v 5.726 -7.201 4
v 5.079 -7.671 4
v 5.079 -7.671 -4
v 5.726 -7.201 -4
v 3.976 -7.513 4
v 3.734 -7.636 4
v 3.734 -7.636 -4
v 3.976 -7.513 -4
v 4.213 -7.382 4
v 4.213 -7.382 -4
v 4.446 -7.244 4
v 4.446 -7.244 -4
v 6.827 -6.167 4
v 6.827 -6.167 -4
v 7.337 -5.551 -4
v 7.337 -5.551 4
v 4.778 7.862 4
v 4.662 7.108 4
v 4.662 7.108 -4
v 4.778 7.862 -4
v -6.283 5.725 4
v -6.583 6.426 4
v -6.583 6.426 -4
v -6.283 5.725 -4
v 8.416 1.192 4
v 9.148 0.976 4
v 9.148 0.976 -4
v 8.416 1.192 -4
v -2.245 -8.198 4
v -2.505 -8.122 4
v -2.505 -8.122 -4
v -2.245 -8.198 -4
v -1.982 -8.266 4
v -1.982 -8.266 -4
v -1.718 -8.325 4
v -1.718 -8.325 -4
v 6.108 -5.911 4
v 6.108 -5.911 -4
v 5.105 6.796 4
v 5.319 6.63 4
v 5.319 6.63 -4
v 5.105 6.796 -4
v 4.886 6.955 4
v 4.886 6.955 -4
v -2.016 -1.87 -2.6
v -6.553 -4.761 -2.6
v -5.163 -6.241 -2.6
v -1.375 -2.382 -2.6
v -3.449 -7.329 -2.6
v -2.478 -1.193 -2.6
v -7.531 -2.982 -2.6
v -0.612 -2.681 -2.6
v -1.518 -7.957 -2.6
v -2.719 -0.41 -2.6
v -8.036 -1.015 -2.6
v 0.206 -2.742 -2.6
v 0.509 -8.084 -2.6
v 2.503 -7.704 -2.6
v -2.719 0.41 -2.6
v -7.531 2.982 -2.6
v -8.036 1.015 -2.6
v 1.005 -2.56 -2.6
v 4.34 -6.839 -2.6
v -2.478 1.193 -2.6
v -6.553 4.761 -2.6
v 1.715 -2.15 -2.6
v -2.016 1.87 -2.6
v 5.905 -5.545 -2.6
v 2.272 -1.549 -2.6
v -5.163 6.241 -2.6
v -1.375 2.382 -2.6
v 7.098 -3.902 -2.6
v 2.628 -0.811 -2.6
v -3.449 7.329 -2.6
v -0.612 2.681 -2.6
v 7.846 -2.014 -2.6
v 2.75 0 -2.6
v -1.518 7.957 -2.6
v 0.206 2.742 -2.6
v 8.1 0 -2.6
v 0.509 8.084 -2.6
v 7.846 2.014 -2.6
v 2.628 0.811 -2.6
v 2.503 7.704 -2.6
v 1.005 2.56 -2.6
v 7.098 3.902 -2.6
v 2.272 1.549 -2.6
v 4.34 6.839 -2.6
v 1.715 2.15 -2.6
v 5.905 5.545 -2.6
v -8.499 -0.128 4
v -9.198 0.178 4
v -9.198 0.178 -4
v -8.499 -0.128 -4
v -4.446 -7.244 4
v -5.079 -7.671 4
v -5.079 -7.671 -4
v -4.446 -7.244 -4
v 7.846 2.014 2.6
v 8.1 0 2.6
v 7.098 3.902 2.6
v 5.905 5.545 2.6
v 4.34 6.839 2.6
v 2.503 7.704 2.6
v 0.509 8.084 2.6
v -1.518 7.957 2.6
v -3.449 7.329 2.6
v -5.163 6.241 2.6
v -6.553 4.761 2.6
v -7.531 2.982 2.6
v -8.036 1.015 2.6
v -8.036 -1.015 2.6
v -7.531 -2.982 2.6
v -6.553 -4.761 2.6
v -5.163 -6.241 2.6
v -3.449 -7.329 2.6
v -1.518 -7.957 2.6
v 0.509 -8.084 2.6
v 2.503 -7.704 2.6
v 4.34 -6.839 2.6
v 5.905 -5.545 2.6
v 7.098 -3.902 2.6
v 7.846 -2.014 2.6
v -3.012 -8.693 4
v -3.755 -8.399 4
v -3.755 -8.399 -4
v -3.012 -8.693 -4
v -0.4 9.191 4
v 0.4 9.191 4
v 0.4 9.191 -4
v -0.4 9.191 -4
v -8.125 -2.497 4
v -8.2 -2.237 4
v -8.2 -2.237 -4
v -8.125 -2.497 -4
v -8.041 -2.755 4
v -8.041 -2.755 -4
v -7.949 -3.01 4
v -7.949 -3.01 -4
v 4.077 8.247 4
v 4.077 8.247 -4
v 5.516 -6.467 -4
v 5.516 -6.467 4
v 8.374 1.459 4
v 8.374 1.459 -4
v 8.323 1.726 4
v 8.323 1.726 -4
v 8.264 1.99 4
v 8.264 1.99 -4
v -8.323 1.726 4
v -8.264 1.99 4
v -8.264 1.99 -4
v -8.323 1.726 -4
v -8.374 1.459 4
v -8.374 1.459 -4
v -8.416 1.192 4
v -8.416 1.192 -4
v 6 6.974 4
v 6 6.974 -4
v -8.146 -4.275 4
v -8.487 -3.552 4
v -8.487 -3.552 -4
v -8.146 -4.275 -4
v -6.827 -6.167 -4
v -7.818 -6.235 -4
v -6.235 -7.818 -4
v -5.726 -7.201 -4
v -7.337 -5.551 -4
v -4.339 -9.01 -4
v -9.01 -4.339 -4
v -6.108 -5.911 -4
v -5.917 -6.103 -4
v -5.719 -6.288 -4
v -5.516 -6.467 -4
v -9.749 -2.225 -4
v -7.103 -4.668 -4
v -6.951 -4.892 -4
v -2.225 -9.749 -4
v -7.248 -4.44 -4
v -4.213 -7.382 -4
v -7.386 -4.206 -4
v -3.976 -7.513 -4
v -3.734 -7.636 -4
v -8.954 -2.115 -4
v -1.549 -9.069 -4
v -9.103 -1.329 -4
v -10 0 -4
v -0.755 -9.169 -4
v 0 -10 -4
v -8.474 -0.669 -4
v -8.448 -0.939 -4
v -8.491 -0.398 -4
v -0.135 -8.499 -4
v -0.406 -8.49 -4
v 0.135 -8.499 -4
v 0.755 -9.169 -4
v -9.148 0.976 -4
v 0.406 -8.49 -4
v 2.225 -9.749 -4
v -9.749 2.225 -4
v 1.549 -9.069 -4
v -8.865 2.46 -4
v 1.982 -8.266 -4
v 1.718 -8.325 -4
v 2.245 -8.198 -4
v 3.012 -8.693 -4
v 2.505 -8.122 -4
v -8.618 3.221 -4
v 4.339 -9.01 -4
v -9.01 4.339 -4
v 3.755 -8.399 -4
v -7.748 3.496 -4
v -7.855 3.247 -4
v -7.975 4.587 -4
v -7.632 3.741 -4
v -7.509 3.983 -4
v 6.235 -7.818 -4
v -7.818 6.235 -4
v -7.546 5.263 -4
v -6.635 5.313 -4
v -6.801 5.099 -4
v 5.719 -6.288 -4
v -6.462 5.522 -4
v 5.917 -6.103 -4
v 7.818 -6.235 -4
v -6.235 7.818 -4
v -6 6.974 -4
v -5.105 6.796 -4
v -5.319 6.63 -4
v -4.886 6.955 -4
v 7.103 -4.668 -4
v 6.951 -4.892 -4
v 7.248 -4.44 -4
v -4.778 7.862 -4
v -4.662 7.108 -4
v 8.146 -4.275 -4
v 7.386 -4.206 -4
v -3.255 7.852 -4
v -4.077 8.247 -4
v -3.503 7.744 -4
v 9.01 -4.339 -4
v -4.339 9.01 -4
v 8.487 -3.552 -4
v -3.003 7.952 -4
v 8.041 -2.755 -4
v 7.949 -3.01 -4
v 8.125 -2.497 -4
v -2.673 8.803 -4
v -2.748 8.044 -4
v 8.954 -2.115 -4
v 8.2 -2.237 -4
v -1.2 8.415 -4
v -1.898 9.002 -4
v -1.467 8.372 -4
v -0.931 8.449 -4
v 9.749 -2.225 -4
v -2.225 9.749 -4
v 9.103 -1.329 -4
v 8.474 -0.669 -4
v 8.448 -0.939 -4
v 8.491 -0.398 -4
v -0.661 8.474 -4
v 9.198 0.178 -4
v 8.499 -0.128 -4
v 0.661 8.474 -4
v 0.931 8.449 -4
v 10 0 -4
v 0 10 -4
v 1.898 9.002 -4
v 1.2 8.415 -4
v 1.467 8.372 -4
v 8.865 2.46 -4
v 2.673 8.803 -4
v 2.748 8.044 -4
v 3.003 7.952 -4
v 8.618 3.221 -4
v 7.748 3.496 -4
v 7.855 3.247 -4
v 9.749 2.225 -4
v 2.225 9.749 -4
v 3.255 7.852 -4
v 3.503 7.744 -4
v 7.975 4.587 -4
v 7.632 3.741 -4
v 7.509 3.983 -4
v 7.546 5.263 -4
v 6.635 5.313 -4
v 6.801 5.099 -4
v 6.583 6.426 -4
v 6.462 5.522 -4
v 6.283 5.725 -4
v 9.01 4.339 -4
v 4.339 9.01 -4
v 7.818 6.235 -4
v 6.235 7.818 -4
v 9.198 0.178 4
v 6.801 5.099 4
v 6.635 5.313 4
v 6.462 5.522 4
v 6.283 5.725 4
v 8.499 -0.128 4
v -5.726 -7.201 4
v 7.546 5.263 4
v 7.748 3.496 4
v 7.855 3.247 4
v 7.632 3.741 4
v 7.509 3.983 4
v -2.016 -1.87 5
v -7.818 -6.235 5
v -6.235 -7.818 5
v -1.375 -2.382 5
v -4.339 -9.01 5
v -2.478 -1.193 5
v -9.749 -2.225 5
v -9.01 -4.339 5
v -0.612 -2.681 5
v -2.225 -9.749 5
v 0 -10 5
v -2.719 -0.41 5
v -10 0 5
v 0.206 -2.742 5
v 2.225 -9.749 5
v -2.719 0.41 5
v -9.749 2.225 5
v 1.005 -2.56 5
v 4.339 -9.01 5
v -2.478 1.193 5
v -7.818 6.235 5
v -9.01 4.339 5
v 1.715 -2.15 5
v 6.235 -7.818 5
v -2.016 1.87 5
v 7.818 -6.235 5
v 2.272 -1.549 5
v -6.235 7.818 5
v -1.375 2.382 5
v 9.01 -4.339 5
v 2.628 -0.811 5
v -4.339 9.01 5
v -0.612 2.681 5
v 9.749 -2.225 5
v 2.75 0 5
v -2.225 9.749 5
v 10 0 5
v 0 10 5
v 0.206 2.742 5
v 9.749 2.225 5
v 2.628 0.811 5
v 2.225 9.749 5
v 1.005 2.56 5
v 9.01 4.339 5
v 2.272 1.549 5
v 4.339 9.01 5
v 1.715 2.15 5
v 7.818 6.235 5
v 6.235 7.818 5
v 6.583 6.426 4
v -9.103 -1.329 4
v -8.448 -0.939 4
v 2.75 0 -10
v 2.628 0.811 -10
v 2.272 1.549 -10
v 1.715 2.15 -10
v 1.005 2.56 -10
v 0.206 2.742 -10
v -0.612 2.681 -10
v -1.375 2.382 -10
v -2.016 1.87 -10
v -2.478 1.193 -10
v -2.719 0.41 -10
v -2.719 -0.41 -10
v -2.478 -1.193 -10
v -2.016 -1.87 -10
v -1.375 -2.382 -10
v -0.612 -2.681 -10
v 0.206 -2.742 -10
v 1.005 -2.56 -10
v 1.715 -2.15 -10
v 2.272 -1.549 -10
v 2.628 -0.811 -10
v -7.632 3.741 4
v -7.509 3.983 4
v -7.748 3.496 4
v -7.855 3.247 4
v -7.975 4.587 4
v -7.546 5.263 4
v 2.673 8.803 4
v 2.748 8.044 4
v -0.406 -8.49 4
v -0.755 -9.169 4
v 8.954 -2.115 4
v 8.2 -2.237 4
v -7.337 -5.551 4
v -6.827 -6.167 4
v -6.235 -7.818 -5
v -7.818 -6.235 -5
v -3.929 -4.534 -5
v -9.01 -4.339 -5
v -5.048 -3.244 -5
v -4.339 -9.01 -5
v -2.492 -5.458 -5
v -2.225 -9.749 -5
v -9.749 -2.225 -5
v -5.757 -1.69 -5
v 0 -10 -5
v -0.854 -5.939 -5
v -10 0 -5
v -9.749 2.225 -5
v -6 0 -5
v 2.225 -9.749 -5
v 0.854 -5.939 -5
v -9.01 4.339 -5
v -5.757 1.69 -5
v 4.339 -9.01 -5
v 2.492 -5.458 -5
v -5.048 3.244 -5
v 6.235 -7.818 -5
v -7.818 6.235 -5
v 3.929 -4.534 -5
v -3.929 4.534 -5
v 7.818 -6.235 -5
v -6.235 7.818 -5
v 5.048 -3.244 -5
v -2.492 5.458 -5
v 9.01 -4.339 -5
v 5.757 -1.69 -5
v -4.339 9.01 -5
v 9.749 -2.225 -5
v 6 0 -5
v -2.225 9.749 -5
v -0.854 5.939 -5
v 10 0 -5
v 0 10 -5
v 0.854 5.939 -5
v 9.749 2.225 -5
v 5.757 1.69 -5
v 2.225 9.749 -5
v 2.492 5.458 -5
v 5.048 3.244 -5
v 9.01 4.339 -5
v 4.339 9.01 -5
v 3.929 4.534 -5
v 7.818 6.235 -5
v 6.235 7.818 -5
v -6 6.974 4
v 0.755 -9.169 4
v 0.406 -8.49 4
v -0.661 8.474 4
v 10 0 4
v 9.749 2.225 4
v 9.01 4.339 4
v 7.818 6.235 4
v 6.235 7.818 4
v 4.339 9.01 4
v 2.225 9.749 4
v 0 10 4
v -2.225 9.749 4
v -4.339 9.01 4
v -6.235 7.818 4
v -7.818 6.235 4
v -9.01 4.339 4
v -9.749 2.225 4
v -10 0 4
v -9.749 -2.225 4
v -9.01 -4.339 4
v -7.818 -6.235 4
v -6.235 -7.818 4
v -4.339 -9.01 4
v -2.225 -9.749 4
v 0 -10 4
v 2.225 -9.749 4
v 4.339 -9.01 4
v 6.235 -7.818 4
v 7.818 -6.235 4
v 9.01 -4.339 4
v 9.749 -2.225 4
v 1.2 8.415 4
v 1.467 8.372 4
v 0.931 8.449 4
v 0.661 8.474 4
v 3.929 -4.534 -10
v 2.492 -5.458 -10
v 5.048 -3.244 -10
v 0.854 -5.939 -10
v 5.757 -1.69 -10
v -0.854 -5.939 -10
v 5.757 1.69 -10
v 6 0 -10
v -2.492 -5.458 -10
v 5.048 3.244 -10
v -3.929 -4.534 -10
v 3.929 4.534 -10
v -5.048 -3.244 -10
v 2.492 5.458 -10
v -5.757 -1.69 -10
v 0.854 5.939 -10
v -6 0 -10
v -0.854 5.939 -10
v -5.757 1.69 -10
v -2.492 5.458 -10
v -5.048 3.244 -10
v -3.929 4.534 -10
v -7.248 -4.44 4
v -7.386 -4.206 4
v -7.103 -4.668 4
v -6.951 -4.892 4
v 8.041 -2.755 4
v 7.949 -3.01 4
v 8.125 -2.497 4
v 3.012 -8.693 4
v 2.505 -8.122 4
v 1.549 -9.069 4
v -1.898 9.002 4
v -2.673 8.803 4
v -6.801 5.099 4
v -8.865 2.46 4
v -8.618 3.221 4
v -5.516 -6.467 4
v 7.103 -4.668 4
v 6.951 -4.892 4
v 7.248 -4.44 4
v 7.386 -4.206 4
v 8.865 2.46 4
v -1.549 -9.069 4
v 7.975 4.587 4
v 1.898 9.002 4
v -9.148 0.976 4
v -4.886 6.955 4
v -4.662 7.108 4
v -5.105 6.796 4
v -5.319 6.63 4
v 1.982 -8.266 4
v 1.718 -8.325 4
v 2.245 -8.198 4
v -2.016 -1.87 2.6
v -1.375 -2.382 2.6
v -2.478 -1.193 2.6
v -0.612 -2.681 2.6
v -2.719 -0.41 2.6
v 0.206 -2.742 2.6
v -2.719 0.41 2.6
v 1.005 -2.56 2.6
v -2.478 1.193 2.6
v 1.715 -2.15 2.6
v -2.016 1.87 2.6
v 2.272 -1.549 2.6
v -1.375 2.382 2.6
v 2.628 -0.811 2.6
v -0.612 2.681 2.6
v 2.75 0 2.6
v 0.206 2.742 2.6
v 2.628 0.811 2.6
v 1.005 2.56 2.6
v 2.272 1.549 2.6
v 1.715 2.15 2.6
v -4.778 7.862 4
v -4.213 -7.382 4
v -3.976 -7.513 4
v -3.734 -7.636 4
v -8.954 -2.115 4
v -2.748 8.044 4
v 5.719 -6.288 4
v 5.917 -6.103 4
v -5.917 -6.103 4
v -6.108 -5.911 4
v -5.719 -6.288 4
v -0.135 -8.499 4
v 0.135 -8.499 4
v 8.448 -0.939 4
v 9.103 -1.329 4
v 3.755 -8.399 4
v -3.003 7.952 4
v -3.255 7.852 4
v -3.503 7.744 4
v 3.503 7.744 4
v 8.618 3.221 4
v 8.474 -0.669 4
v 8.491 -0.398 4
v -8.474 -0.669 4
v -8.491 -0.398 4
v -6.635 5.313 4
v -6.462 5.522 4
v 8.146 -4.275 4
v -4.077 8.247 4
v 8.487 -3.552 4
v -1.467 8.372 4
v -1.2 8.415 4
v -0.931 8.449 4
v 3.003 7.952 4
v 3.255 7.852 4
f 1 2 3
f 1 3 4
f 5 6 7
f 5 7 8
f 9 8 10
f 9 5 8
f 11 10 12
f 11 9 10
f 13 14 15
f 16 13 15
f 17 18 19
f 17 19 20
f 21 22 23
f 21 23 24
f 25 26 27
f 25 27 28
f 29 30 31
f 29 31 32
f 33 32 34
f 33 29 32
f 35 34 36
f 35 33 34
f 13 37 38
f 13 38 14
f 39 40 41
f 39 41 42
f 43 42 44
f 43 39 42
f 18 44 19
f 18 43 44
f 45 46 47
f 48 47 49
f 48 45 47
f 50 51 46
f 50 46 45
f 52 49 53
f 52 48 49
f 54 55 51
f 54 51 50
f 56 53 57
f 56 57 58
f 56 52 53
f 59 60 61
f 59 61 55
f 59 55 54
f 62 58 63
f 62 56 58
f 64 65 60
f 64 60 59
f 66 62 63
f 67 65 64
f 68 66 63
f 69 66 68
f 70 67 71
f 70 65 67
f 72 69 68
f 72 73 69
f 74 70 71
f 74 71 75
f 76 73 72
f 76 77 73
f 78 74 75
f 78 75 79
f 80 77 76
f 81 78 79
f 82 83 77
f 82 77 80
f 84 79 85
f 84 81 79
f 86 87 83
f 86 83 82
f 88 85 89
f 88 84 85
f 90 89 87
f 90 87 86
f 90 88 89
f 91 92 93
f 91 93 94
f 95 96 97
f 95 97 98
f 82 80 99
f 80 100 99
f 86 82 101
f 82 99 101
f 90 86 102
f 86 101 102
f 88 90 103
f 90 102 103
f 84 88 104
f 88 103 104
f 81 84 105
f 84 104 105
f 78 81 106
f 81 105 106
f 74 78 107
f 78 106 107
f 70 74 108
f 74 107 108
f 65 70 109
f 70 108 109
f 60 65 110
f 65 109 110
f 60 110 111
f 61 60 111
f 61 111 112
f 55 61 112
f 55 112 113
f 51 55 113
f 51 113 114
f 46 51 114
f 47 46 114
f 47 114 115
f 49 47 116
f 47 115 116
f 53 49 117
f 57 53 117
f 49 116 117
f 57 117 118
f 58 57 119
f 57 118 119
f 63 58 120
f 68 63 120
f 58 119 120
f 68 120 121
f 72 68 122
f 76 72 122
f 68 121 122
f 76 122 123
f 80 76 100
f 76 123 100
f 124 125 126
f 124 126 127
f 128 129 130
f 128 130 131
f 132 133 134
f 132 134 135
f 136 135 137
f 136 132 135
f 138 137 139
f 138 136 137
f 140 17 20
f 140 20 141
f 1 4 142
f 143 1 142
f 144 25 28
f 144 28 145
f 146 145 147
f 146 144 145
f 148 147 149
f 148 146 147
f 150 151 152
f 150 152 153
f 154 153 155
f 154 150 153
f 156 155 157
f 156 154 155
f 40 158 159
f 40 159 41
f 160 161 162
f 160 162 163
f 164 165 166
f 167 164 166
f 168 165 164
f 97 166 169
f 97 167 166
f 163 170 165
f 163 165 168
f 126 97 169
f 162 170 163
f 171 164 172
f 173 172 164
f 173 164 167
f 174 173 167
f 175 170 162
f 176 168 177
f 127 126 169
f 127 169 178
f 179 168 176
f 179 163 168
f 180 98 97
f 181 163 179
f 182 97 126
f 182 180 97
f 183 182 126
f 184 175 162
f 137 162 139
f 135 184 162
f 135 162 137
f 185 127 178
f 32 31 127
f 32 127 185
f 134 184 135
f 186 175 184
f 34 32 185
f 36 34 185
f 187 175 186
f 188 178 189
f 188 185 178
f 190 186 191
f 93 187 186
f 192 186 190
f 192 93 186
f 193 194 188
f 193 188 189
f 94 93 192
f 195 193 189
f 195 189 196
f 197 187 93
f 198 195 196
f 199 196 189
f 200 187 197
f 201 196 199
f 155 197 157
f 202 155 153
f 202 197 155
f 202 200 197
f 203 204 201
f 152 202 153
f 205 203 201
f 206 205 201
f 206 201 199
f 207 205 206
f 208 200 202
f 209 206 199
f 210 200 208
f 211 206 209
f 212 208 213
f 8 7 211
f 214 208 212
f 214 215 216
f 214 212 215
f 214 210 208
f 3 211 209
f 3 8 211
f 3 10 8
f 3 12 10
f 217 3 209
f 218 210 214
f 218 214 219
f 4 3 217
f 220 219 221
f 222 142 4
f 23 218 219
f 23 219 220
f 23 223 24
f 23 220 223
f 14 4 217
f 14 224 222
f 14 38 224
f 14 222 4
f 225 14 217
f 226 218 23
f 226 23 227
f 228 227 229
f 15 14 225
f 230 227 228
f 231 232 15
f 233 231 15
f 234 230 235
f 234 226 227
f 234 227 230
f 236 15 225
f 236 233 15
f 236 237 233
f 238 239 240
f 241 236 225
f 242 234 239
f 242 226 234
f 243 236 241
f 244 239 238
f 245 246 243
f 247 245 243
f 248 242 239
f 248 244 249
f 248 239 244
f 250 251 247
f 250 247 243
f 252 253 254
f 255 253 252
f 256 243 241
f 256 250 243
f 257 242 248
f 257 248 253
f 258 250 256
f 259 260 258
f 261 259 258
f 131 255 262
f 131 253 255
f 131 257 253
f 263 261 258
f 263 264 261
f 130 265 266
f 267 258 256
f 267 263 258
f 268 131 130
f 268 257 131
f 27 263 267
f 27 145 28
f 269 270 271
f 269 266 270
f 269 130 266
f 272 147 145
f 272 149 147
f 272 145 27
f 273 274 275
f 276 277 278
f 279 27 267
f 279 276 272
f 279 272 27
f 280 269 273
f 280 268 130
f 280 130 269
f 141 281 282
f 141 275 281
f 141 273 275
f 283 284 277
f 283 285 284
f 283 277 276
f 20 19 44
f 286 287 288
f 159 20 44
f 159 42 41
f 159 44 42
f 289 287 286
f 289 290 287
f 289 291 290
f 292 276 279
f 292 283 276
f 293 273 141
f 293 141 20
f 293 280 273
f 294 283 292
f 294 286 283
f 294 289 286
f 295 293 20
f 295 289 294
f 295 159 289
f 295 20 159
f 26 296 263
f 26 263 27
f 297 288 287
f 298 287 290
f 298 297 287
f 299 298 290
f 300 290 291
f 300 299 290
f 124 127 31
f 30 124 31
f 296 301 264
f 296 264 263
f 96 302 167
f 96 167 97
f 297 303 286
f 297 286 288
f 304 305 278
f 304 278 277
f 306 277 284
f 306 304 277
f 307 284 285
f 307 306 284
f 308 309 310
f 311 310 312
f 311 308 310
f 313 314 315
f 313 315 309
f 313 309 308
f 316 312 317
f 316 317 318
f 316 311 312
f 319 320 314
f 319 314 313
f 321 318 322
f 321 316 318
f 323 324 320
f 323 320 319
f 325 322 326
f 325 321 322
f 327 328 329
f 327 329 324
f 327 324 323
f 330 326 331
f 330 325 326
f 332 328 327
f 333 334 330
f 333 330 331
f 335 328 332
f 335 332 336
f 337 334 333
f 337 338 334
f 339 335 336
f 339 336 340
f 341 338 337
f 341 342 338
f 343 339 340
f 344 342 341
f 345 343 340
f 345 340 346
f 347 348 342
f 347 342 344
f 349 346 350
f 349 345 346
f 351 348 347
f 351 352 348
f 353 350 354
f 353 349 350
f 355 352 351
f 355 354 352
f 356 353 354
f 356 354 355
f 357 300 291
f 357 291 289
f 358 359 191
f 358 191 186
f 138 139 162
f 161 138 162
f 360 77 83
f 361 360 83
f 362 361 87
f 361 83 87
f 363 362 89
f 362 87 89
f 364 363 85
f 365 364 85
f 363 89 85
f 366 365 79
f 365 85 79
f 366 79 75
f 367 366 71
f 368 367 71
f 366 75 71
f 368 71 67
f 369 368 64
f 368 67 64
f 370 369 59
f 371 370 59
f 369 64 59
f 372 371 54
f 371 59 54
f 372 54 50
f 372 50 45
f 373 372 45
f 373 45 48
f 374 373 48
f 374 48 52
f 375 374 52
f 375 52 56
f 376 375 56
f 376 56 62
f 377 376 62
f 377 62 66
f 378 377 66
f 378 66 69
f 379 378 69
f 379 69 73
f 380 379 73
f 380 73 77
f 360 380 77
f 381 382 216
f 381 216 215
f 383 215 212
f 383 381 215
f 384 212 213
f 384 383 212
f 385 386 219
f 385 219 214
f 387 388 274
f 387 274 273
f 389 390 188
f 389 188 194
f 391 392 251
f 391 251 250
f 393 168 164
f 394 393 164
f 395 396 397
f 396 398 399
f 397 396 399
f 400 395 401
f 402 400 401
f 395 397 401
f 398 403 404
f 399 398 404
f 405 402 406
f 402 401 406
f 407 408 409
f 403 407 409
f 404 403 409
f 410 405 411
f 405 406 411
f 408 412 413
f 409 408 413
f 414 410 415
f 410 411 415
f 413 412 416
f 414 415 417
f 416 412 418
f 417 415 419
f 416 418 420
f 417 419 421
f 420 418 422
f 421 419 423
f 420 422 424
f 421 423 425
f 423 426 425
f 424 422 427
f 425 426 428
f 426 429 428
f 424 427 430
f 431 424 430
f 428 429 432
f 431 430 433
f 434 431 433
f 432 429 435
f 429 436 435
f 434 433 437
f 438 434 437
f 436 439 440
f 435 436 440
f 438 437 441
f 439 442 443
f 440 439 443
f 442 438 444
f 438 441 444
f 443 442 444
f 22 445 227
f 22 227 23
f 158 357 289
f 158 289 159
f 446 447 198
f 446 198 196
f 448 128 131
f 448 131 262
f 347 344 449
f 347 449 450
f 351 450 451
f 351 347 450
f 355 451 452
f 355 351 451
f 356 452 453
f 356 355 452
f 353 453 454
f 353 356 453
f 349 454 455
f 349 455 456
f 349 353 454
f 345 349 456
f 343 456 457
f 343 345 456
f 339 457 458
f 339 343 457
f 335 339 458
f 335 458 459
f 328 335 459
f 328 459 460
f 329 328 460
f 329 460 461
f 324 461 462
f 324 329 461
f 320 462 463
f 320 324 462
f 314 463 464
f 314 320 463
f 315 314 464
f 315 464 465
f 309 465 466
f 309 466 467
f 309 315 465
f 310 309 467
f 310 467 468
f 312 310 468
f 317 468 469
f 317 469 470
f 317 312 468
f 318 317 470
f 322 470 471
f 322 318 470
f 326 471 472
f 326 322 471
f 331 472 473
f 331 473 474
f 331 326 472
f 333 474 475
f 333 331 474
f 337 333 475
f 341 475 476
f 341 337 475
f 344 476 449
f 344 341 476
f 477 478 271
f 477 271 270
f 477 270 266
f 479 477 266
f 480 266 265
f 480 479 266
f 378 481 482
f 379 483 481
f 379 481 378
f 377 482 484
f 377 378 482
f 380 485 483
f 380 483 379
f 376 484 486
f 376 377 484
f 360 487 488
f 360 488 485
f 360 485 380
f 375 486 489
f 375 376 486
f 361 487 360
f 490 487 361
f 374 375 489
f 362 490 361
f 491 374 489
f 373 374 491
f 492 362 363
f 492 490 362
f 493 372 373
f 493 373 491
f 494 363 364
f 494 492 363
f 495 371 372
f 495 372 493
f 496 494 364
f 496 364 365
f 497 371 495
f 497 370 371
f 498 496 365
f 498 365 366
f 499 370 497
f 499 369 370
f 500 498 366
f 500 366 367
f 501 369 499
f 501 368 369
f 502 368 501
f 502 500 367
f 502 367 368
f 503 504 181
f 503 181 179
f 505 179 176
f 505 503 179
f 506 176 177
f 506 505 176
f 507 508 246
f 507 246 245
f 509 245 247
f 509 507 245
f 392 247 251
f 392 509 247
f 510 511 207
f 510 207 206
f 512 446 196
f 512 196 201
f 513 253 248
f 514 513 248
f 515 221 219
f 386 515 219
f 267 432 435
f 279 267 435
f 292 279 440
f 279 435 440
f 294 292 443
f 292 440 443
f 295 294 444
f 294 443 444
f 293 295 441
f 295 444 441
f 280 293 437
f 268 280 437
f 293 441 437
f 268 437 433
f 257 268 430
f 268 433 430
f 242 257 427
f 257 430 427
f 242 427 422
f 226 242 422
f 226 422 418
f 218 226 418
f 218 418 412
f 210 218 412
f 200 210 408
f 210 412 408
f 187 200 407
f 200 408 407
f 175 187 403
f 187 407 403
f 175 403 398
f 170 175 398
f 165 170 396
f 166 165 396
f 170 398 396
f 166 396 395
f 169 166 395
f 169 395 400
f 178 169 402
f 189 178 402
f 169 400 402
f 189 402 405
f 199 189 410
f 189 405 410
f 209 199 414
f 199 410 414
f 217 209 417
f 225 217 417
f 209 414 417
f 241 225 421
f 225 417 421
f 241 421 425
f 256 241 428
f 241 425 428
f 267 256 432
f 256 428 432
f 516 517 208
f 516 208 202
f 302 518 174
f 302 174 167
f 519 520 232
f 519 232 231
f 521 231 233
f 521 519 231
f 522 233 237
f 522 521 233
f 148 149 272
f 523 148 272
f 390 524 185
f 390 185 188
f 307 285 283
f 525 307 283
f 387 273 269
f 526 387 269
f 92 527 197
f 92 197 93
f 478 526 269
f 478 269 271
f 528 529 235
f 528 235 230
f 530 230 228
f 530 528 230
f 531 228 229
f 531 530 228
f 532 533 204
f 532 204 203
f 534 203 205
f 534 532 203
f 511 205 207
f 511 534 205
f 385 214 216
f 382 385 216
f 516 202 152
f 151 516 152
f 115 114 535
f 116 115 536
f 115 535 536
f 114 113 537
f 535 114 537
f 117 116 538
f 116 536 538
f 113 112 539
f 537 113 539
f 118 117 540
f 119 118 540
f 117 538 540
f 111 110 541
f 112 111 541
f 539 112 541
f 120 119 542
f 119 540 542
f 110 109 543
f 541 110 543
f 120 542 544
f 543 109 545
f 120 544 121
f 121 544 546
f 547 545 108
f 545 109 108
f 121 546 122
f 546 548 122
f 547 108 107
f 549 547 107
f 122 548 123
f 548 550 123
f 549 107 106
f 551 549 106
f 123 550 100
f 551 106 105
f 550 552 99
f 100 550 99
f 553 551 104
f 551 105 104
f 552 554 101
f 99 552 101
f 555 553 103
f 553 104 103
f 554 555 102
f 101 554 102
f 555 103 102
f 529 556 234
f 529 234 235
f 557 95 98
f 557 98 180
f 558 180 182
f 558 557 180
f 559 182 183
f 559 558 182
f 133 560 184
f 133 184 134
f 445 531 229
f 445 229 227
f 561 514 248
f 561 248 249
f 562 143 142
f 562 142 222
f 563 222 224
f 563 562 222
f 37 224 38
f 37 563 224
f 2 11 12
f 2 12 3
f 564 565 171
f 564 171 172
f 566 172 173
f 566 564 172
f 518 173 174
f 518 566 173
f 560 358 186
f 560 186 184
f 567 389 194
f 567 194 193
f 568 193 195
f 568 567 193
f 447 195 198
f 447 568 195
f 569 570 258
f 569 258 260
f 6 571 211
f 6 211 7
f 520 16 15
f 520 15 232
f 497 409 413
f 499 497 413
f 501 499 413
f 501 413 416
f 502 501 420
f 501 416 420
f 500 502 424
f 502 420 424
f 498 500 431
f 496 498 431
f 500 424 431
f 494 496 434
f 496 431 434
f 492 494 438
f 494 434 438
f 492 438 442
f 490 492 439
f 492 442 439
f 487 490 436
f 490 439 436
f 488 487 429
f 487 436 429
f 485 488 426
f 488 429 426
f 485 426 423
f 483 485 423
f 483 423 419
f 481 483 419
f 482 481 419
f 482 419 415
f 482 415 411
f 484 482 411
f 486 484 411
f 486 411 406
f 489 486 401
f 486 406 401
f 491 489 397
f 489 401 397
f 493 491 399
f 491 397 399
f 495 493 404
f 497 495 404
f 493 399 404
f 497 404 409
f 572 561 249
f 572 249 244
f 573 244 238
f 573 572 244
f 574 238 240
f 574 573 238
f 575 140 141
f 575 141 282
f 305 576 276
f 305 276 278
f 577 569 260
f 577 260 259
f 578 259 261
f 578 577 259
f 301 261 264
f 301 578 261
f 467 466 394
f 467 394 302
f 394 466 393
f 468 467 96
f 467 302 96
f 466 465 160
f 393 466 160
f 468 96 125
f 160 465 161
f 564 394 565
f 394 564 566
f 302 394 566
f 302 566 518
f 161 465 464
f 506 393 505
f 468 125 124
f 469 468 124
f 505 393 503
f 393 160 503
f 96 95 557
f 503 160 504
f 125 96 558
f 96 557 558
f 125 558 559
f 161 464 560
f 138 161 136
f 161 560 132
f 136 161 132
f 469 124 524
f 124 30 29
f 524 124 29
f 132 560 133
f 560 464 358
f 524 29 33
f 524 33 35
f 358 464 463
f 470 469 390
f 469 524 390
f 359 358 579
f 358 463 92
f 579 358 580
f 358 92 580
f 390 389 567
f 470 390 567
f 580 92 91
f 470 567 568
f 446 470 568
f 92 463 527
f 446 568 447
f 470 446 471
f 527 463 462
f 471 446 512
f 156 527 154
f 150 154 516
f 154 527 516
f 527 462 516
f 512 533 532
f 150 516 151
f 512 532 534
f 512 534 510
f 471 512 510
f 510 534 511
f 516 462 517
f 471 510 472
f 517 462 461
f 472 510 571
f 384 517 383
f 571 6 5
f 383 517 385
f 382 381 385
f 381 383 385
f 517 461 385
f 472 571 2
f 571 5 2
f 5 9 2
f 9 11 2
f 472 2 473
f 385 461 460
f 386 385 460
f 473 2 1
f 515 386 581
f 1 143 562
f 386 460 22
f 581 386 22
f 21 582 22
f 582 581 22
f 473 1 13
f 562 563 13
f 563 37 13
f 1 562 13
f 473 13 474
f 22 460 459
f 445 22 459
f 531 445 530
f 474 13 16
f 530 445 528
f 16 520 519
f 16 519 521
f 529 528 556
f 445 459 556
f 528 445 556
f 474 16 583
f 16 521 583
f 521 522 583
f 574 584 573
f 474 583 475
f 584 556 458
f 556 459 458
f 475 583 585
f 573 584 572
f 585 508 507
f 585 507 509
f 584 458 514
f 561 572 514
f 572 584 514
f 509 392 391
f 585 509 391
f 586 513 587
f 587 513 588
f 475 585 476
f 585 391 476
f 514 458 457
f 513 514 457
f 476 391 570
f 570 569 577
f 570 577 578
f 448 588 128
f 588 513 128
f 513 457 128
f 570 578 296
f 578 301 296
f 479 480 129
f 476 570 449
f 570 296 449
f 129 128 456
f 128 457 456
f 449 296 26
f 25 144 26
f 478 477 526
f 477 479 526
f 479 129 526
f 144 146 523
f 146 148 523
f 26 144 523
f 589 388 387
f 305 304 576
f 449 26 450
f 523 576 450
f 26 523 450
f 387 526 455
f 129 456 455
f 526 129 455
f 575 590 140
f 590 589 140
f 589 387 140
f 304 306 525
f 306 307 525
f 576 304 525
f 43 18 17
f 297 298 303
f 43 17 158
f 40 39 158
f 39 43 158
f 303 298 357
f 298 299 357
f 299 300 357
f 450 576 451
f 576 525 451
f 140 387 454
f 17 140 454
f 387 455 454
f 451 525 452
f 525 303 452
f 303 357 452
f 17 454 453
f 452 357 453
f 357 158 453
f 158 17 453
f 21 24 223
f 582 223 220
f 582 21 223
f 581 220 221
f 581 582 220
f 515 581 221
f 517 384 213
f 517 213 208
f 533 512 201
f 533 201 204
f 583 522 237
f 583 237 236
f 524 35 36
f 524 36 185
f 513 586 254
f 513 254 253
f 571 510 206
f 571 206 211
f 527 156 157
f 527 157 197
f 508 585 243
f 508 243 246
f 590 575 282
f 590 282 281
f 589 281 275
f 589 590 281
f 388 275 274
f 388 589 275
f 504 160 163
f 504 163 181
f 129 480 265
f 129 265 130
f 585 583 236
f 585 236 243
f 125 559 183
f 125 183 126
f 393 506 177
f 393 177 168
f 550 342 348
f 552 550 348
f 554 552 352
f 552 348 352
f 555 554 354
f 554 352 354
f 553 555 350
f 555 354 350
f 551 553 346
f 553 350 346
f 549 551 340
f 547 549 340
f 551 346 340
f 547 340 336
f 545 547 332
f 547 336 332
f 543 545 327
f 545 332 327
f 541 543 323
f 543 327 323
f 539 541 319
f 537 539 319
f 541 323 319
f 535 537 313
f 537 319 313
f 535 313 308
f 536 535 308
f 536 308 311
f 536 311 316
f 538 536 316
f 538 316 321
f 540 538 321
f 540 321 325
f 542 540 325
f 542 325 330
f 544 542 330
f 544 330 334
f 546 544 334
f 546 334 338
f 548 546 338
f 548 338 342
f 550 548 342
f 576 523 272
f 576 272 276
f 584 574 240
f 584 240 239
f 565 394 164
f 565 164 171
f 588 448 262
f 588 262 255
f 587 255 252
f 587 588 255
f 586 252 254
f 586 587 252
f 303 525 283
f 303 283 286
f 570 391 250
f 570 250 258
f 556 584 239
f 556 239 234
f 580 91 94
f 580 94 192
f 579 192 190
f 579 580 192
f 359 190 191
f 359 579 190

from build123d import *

# Parameters (mm, degrees)
BOSS_EXTRUDE1_DEPTH = 5
SKETCH2_R           = 10
BOSS_EXTRUDE2_DEPTH = 1
SKETCH4_R           = 6
BOSS_EXTRUDE3_DEPTH = 5
CUT_EXTRUDE1_REACH  = 17
SKETCH5_R           = 2.75
SKETCH7_R           = 8.1
CUT_EXTRUDE2_DEPTH  = 2.6


with BuildPart() as part:
    # Sketch1 → Boss-Extrude1 (new body, symmetric)
    with BuildSketch(Plane.XY):
        with BuildLine():
            Line((-0.4, 9.191300234), (-0.660980834, 8.474261286))
            ThreePointArc((-0.660980834, 8.474261286), (-1.065332485, 8.432974961), (-1.467248177, 8.372406033))
            Line((-1.467248177, 8.372406033), (-1.898350154, 9.002014591))
            Line((-1.898350154, 9.002014591), (-2.673216683, 8.803062681))
            Line((-2.673216683, 8.803062681), (-2.747677989, 8.043647535))
            ThreePointArc((-2.747677989, 8.043647535), (-3.129058698, 7.90310013), (-3.503284589, 7.744481718))
            Line((-3.503284589, 7.744481718), (-4.077419986, 8.247099263))
            Line((-4.077419986, 8.247099263), (-4.77846533, 7.861696324))
            Line((-4.77846533, 7.861696324), (-4.66172843, 7.107621828))
            ThreePointArc((-4.66172843, 7.107621828), (-4.996174644, 6.876644452), (-5.319196746, 6.629943135))
            Line((-5.319196746, 6.629943135), (-6.000290524, 6.973988359))
            Line((-6.000290524, 6.973988359), (-6.583465426, 6.426350674))
            Line((-6.583465426, 6.426350674), (-6.282865329, 5.724998101))
            ThreePointArc((-6.282865329, 5.724998101), (-6.549362564, 5.418103913), (-6.80088421, 5.098820841))
            Line((-6.80088421, 5.098820841), (-7.546140742, 5.262676117))
            Line((-7.546140742, 5.262676117), (-7.974802178, 4.587213776))
            Line((-7.974802178, 4.587213776), (-7.509226693, 3.982651688))
            ThreePointArc((-7.509226693, 3.982651688), (-7.691029946, 3.619123978), (-7.855247106, 3.247320882))
            Line((-7.855247106, 3.247320882), (-8.617839183, 3.220690579))
            Line((-8.617839183, 3.220690579), (-8.865052779, 2.459845366))
            Line((-8.865052779, 2.459845366), (-8.263755727, 1.990060623))
            ThreePointArc((-8.263755727, 1.990060623), (-8.349441631, 1.592741174), (-8.416035937, 1.191779808))
            Line((-8.416035937, 1.191779808), (-9.148047095, 0.976337208))
            Line((-9.148047095, 0.976337208), (-9.198279511, 0.177915826))
            Line((-9.198279511, 0.177915826), (-8.499042597, -0.127573271))
            ThreePointArc((-8.499042597, -0.127573271), (-8.483227192, -0.533719416), (-8.448014278, -0.938645173))
            Line((-8.448014278, -0.938645173), (-9.103449564, -1.32936302))
            Line((-9.103449564, -1.32936302), (-8.953544512, -2.115192821))
            Line((-8.953544512, -2.115192821), (-8.200303363, -2.237191266))
            ThreePointArc((-8.200303363, -2.237191266), (-8.083980389, -2.626644452), (-7.949172812, -3.010091627))
            Line((-7.949172812, -3.010091627), (-8.486848816, -3.551534481))
            Line((-8.486848816, -3.551534481), (-8.146225383, -4.275396123))
            Line((-8.146225383, -4.275396123), (-7.38630891, -4.206238307))
            ThreePointArc((-7.38630891, -4.206238307), (-7.176787367, -4.554527757), (-6.950855584, -4.892402953))
            Line((-6.950855584, -4.892402953), (-7.336988145, -5.550549969))
            Line((-7.336988145, -5.550549969), (-6.827048953, -6.166960564))
            Line((-6.827048953, -6.166960564), (-6.108205503, -5.910991925))
            ThreePointArc((-6.108205503, -5.910991925), (-5.8186504, -6.196233333), (-5.515790536, -6.467306608))
            Line((-5.515790536, -6.467306608), (-5.726117525, -7.200803989))
            Line((-5.726117525, -7.200803989), (-5.078903929, -7.671032191))
            Line((-5.078903929, -7.671032191), (-4.44630108, -7.244336181))
            ThreePointArc((-4.44630108, -7.244336181), (-4.09490623, -7.44860678), (-3.734148082, -7.635845605))
            Line((-3.734148082, -7.635845605), (-3.755453882, -8.398605012))
            Line((-3.755453882, -8.398605012), (-3.011632693, -8.693104654))
            Line((-3.011632693, -8.693104654), (-2.505019208, -8.122492153))
            ThreePointArc((-2.505019208, -8.122492153), (-2.113864041, -8.23295687), (-1.717875372, -8.324596339))
            Line((-1.717875372, -8.324596339), (-1.54882126, -9.068690793))
            Line((-1.54882126, -9.068690793), (-0.755129499, -9.16895738))
            Line((-0.755129499, -9.16895738), (-0.406337766, -8.49028207))
            ThreePointArc((-0.406337766, -8.49028207), (0, -8.5), (0.406337766, -8.49028207))
            Line((0.406337766, -8.49028207), (0.755129499, -9.16895738))
            Line((0.755129499, -9.16895738), (1.54882126, -9.068690793))
            Line((1.54882126, -9.068690793), (1.717875372, -8.324596339))
            ThreePointArc((1.717875372, -8.324596339), (2.113864041, -8.23295687), (2.505019208, -8.122492153))
            Line((2.505019208, -8.122492153), (3.011632693, -8.693104654))
            Line((3.011632693, -8.693104654), (3.755453882, -8.398605012))
            Line((3.755453882, -8.398605012), (3.734148082, -7.635845605))
            ThreePointArc((3.734148082, -7.635845605), (4.09490623, -7.44860678), (4.44630108, -7.244336181))
            Line((4.44630108, -7.244336181), (5.078903929, -7.671032191))
            Line((5.078903929, -7.671032191), (5.726117525, -7.200803989))
            Line((5.726117525, -7.200803989), (5.515790536, -6.467306608))
            ThreePointArc((5.515790536, -6.467306608), (5.8186504, -6.196233333), (6.108205503, -5.910991925))
            Line((6.108205503, -5.910991925), (6.827048953, -6.166960564))
            Line((6.827048953, -6.166960564), (7.336988145, -5.550549969))
            Line((7.336988145, -5.550549969), (6.950855584, -4.892402953))
            ThreePointArc((6.950855584, -4.892402953), (7.176787367, -4.554527757), (7.38630891, -4.206238307))
            Line((7.38630891, -4.206238307), (8.146225383, -4.275396123))
            Line((8.146225383, -4.275396123), (8.486848816, -3.551534481))
            Line((8.486848816, -3.551534481), (7.949172812, -3.010091627))
            ThreePointArc((7.949172812, -3.010091627), (8.083980389, -2.626644452), (8.200303363, -2.237191266))
            Line((8.200303363, -2.237191266), (8.953544512, -2.115192821))
            Line((8.953544512, -2.115192821), (9.103449564, -1.32936302))
            Line((9.103449564, -1.32936302), (8.448014278, -0.938645173))
            ThreePointArc((8.448014278, -0.938645173), (8.483227192, -0.533719416), (8.499042597, -0.127573271))
            Line((8.499042597, -0.127573271), (9.198279511, 0.177915826))
            Line((9.198279511, 0.177915826), (9.148047095, 0.976337208))
            Line((9.148047095, 0.976337208), (8.416035937, 1.191779808))
            ThreePointArc((8.416035937, 1.191779808), (8.349441631, 1.592741174), (8.263755727, 1.990060623))
            Line((8.263755727, 1.990060623), (8.865052779, 2.459845366))
            Line((8.865052779, 2.459845366), (8.617839183, 3.220690579))
            Line((8.617839183, 3.220690579), (7.855247106, 3.247320882))
            ThreePointArc((7.855247106, 3.247320882), (7.691029946, 3.619123978), (7.509226693, 3.982651688))
            Line((7.509226693, 3.982651688), (7.974802178, 4.587213776))
            Line((7.974802178, 4.587213776), (7.546140742, 5.262676117))
            Line((7.546140742, 5.262676117), (6.80088421, 5.098820841))
            ThreePointArc((6.80088421, 5.098820841), (6.549362564, 5.418103913), (6.282865329, 5.724998101))
            Line((6.282865329, 5.724998101), (6.583465426, 6.426350674))
            Line((6.583465426, 6.426350674), (6.000290524, 6.973988359))
            Line((6.000290524, 6.973988359), (5.319196746, 6.629943135))
            ThreePointArc((5.319196746, 6.629943135), (4.996174644, 6.876644452), (4.66172843, 7.107621828))
            Line((4.66172843, 7.107621828), (4.77846533, 7.861696324))
            Line((4.77846533, 7.861696324), (4.077419986, 8.247099263))
            Line((4.077419986, 8.247099263), (3.503284589, 7.744481718))
            ThreePointArc((3.503284589, 7.744481718), (3.129058698, 7.90310013), (2.747677989, 8.043647535))
            Line((2.747677989, 8.043647535), (2.673216683, 8.803062681))
            Line((2.673216683, 8.803062681), (1.898350154, 9.002014591))
            Line((1.898350154, 9.002014591), (1.467248177, 8.372406033))
            ThreePointArc((1.467248177, 8.372406033), (1.065332485, 8.432974961), (0.660980834, 8.474261286))
            Line((0.660980834, 8.474261286), (0.4, 9.191300234))
            Line((0.4, 9.191300234), (-0.4, 9.191300234))
        make_face()
    extrude(amount=BOSS_EXTRUDE1_DEPTH, both=True)

    # Sketch2 → Boss-Extrude2 (add)
    with BuildSketch(Plane.XY.offset(5)):
        Circle(SKETCH2_R)
    boss_extrude2 = extrude(amount=-BOSS_EXTRUDE2_DEPTH)

    # Mirror1: Boss-Extrude2 across plane
    add(boss_extrude2.mirror(Plane.XY))

    # Sketch4 → Boss-Extrude3 (add)
    with BuildSketch(Plane(origin=(0, 0, -5), x_dir=(-1, 0, 0), z_dir=(0, 0, -1))):
        Circle(SKETCH4_R)
    extrude(amount=BOSS_EXTRUDE3_DEPTH)

    # Sketch5 → Cut-Extrude1 (cut, up to next)
    with BuildSketch(Plane.XY.offset(5), mode=Mode.PRIVATE) as cut_extrude1_sk1:
        Circle(SKETCH5_R)
    cut_extrude1_tool1 = extrude(cut_extrude1_sk1.sketch, amount=-CUT_EXTRUDE1_REACH, mode=Mode.PRIVATE) & part.part
    add(cut_extrude1_tool1.solids().sort_by_distance((0, 0, 5))[0], mode=Mode.SUBTRACT)

    # Sketch7 → Cut-Extrude2 (cut, symmetric)
    with BuildSketch(Plane.XY):
        Circle(SKETCH7_R)
    extrude(amount=CUT_EXTRUDE2_DEPTH, both=True, mode=Mode.SUBTRACT)


solid = part.part
